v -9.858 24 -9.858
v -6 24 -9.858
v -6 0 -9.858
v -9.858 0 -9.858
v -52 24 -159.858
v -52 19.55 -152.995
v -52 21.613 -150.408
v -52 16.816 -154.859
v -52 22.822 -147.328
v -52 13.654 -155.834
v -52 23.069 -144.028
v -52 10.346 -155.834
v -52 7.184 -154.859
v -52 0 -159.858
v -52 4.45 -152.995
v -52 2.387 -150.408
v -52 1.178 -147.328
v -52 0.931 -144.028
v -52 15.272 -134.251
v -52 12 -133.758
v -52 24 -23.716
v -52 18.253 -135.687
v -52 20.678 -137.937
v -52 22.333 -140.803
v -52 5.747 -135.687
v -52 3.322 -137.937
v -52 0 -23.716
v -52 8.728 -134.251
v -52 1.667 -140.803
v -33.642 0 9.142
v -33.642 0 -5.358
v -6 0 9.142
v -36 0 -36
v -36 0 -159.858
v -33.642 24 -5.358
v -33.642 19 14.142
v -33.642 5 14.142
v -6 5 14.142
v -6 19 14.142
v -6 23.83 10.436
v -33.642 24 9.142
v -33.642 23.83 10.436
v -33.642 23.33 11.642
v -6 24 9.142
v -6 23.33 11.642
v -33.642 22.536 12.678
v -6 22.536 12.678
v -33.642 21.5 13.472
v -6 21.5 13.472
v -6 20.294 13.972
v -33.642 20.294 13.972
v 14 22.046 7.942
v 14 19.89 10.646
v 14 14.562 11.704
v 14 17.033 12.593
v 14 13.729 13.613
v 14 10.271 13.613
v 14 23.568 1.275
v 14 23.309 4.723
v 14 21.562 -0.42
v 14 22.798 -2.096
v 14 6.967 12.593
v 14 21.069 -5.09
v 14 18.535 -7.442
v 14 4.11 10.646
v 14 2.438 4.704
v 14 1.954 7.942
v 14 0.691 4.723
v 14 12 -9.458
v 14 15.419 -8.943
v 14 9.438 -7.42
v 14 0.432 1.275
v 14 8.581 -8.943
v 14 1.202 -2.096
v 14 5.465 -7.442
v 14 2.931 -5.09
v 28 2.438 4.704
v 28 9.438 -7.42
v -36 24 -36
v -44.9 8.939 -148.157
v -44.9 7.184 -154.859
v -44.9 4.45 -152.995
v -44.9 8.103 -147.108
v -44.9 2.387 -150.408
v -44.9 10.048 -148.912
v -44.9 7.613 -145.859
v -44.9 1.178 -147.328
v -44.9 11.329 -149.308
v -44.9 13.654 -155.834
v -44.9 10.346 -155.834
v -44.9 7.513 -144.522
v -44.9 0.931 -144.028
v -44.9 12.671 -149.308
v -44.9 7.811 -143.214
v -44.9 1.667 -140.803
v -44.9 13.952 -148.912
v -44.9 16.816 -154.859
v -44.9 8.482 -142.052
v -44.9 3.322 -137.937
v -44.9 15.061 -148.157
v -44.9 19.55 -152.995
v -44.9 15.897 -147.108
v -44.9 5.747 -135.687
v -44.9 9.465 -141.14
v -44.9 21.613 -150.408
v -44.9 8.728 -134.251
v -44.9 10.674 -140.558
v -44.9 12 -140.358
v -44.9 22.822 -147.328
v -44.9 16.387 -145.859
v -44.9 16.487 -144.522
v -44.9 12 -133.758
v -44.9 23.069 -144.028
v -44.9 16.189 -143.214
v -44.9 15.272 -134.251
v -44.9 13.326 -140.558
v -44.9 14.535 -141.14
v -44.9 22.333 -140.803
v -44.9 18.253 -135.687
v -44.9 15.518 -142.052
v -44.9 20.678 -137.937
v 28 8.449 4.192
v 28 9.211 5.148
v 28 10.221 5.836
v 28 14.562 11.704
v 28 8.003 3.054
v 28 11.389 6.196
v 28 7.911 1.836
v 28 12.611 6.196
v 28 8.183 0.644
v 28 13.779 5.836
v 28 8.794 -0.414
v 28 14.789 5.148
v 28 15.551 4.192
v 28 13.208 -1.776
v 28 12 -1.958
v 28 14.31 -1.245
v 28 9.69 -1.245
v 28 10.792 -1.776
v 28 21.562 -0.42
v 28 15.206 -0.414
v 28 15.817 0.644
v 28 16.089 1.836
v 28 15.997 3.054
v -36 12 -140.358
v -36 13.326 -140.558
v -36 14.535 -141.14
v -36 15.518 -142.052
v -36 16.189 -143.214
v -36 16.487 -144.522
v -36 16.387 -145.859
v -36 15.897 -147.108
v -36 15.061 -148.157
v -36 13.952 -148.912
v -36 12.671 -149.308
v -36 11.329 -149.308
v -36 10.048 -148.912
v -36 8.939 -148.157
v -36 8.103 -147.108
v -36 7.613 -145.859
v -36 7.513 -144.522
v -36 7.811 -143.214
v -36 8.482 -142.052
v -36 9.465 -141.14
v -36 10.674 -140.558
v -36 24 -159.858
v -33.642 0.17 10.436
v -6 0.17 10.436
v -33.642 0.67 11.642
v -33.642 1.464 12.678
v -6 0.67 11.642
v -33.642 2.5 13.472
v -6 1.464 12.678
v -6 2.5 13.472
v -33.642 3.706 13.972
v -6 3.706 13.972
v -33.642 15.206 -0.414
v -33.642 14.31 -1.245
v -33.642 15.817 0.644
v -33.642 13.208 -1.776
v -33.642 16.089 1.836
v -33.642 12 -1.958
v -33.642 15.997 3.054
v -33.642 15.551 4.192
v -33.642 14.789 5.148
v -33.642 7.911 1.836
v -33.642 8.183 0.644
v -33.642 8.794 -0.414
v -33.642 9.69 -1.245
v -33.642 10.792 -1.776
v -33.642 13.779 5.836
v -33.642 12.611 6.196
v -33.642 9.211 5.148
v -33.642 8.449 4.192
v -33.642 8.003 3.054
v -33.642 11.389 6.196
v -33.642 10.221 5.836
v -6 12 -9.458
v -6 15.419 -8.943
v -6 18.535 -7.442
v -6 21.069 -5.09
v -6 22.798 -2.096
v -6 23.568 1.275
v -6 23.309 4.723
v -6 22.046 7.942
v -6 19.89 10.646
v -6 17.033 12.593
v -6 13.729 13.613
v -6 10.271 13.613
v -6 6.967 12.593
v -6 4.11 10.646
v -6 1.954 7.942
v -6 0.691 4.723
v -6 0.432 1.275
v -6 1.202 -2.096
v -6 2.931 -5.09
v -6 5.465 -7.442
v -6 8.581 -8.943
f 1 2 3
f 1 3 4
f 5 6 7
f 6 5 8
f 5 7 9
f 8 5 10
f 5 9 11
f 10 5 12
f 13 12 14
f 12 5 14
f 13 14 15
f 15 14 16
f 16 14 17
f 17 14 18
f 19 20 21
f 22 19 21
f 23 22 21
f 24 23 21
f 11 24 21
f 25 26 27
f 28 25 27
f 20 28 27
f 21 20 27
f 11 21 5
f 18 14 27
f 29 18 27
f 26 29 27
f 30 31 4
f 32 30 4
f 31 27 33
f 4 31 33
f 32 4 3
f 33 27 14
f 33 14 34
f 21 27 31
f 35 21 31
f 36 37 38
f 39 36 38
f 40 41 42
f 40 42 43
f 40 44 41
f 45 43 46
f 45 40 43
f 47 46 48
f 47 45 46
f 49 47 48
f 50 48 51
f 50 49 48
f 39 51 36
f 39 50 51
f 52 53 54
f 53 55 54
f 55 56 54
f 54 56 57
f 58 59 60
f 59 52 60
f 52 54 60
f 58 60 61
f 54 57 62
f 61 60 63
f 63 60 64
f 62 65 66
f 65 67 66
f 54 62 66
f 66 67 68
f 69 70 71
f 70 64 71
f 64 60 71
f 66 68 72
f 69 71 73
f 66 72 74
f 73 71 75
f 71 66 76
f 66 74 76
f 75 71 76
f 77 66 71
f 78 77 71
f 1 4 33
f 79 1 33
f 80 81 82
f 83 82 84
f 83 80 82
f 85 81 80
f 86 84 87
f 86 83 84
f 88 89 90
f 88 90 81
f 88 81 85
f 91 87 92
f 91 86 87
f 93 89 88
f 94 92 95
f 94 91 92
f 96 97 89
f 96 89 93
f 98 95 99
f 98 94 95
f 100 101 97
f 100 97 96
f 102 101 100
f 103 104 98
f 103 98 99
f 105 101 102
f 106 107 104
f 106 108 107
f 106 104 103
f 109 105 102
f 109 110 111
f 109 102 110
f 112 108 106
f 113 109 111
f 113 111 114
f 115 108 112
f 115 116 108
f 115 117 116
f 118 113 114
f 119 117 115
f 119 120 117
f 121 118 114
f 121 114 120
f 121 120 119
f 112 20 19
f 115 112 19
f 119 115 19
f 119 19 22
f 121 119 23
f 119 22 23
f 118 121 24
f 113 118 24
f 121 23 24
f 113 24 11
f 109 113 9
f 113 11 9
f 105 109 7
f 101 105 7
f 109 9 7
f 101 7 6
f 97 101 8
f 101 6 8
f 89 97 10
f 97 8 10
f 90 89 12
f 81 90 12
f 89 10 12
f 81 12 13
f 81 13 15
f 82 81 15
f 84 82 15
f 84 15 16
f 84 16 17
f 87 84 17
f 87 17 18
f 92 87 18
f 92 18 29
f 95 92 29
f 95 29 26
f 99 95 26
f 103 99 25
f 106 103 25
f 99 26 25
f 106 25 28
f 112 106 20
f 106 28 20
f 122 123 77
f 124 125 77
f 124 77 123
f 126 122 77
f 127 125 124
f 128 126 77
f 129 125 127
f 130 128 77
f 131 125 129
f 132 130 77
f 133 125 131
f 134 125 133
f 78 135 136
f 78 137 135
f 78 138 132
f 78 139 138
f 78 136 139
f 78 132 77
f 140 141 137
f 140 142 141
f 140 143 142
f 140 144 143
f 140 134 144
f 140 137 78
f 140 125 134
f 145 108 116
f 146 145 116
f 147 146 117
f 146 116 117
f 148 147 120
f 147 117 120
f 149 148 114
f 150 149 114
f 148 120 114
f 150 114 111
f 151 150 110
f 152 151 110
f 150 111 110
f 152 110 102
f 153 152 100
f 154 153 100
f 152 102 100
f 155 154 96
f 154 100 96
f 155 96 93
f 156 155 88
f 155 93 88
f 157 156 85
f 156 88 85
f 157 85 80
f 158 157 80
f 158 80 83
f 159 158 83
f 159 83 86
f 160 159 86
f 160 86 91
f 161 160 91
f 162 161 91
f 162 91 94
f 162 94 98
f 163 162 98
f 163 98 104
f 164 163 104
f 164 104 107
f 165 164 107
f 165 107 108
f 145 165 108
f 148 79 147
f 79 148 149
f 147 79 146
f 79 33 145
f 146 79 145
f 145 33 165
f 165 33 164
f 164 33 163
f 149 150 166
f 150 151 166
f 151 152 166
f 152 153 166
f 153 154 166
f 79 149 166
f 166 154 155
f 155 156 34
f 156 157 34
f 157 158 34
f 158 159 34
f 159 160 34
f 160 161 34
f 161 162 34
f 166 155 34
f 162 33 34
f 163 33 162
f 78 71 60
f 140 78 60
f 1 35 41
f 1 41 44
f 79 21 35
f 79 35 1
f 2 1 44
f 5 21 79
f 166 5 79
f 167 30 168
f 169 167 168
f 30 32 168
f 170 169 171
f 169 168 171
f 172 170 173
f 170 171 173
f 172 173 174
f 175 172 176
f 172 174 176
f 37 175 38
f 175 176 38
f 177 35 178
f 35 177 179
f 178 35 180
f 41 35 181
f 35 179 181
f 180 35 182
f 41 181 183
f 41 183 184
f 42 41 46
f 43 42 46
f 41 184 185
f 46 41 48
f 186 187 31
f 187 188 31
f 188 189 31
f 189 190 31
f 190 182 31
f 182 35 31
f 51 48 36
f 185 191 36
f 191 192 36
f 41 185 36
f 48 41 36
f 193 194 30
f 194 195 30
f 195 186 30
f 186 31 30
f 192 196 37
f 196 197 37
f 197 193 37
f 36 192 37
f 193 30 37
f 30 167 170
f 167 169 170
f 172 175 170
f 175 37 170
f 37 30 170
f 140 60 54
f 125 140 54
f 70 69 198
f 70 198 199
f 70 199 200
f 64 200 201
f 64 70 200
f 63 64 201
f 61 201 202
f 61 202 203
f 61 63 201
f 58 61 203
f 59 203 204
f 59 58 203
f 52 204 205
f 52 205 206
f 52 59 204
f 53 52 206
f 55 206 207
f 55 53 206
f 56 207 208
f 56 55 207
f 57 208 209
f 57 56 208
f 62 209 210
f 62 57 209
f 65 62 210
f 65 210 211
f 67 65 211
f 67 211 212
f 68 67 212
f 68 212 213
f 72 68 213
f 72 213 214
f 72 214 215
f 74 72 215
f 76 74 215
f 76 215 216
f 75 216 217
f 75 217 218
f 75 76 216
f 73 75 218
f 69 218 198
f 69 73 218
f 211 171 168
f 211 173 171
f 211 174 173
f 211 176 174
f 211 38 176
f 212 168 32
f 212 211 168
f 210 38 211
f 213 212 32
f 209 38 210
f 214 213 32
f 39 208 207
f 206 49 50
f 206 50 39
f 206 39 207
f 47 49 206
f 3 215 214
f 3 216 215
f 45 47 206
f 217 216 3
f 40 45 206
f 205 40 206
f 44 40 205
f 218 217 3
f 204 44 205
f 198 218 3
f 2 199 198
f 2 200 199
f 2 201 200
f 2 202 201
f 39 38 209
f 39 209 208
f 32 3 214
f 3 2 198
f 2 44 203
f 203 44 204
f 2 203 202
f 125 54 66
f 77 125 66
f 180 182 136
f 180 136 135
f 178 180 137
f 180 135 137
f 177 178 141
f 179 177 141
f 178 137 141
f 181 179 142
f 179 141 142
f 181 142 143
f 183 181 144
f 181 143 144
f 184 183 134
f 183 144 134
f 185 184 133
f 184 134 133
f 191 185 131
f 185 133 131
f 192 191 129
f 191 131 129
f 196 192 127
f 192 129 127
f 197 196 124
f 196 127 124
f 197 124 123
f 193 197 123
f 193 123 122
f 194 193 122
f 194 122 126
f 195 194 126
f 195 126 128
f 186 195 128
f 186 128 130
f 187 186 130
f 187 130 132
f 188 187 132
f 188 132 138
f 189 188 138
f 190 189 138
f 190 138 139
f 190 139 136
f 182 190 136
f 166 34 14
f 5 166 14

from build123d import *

# Parameters (mm, degrees)
EXTRUDE_1_DEPTH          = 24
SKETCH_2_W               = 24
SKETCH_2_H               = 24
SKETCH_2_R               = 11.6
CUT_EXTRUDE_1_DEPTH      = 20
SKETCH_6_R               = 4.1
CUT_EXTRUDE_3_DEPTH      = 1
CUT_EXTRUDE_3_DEPTH_BACK = 67
FILLET_3_R               = 5
EXTRUDE_2_DEPTH          = 14
SKETCH_10_R              = 4.1
CUT_EXTRUDE_4_DEPTH      = 81
SKETCH_12_R              = 11.1
CUT_EXTRUDE_5_DEPTH      = 7.1
SKETCH_13_R              = 4.5
CUT_EXTRUDE_6_DEPTH      = 73.9


with BuildPart() as part:
    # Эскиз1 → Бобышка-Вытянуть1 (new body)
    with BuildSketch(Plane(origin=(0, 0, 0), x_dir=(1, 0, 0), z_dir=(0, 1, 0))):
        Polygon((-37.857864376, 37.857864376), (-36, 36), (-36, 159.857864376), (-52, 159.857864376), (-52, 23.715728753), align=None)
        Polygon((-36, 23.715728753), (-36, 36), (-37.857864376, 37.857864376), (-52, 23.715728753), align=None)
        Polygon((-33.642135624, 5.357864376), (-14.142135624, -14.142135624), (-14.142135624, 9.857864376), (-9.857864376, 9.857864376), (-36, 36), (-36, 23.715728753), (-52, 23.715728753), align=None)
        Polygon((-14.142135624, -14.142135624), (0, 0), (-9.857864376, 9.857864376), (-14.142135624, 9.857864376), align=None)
        Polygon((-9.857864376, 9.857864376), (0, 0), (-14.142135624, -14.142135624), (14, -14.142135624), (14, 9.857864376), align=None)
        Polygon((-33.642135624, -14.142135624), (-14.142135624, -14.142135624), (-33.642135624, 5.357864376), align=None)
    extrude(amount=EXTRUDE_1_DEPTH)

    # Эскиз2 → Вырез-Вытянуть1 (cut)
    with BuildSketch(Plane(origin=(14, 0, 0), x_dir=(0, 0, -1), z_dir=(1, 0, 0))):
        with Locations((-2.142135624, 12)):
            Rectangle(SKETCH_2_W, SKETCH_2_H)
        with Locations((-2.142135624, 12)):
            Circle(SKETCH_2_R, mode=Mode.SUBTRACT)
    extrude(amount=-CUT_EXTRUDE_1_DEPTH, mode=Mode.SUBTRACT)

    # Эскиз6 → Вырез-Вытянуть3 (cut, two sides)
    with BuildSketch(Plane(origin=(14, 0, 0), x_dir=(0, 0, -1), z_dir=(1, 0, 0))) as cut_extrude_3_sk:
        with Locations((-2.142135624, 12)):
            Circle(SKETCH_6_R)
    extrude(amount=CUT_EXTRUDE_3_DEPTH, mode=Mode.SUBTRACT)
    extrude(cut_extrude_3_sk.sketch, amount=-CUT_EXTRUDE_3_DEPTH_BACK, mode=Mode.SUBTRACT)

    # Скругление3
    fillet_3_edges = [part.edges().sort_by_distance(p)[0] for p in [
        (-19.821067812, 0, 14.142135624),
        (-19.821067812, 24, 14.142135624),
    ]]
    fillet(fillet_3_edges, radius=FILLET_3_R)

    # Эскиз9 → Бобышка-Вытянуть2 (add)
    with BuildSketch(Plane(origin=(14, 0, 0), x_dir=(0, 0, -1), z_dir=(1, 0, 0))):
        Polygon((0.420042203, 21.562177826), (-11.70431345, 14.562177826), (-4.70431345, 2.437822174), (7.420042203, 9.437822174), align=None)
    extrude(amount=EXTRUDE_2_DEPTH)

    # Эскиз10 → Вырез-Вытянуть4 (cut, through all)
    with BuildSketch(Plane(origin=(28, 0, 0), x_dir=(0, 0, -1), z_dir=(1, 0, 0))):
        with Locations((-2.142135624, 12)):
            Circle(SKETCH_10_R)
    extrude(amount=-CUT_EXTRUDE_4_DEPTH, mode=Mode.SUBTRACT)

    # Эскиз12 → Вырез-Вытянуть5 (cut)
    with BuildSketch(Plane.ZY.offset(52)):
        with Locations((-144.857864376, 12)):
            Circle(SKETCH_12_R)
    extrude(amount=-CUT_EXTRUDE_5_DEPTH, mode=Mode.SUBTRACT)

    # Эскиз13 → Вырез-Вытянуть6 (cut, through all)
    with BuildSketch(Plane.ZY.offset(44.9)):
        with Locations((-144.857864376, 12)):
            Circle(SKETCH_13_R)
    extrude(amount=-CUT_EXTRUDE_6_DEPTH, mode=Mode.SUBTRACT)


solid = part.part
